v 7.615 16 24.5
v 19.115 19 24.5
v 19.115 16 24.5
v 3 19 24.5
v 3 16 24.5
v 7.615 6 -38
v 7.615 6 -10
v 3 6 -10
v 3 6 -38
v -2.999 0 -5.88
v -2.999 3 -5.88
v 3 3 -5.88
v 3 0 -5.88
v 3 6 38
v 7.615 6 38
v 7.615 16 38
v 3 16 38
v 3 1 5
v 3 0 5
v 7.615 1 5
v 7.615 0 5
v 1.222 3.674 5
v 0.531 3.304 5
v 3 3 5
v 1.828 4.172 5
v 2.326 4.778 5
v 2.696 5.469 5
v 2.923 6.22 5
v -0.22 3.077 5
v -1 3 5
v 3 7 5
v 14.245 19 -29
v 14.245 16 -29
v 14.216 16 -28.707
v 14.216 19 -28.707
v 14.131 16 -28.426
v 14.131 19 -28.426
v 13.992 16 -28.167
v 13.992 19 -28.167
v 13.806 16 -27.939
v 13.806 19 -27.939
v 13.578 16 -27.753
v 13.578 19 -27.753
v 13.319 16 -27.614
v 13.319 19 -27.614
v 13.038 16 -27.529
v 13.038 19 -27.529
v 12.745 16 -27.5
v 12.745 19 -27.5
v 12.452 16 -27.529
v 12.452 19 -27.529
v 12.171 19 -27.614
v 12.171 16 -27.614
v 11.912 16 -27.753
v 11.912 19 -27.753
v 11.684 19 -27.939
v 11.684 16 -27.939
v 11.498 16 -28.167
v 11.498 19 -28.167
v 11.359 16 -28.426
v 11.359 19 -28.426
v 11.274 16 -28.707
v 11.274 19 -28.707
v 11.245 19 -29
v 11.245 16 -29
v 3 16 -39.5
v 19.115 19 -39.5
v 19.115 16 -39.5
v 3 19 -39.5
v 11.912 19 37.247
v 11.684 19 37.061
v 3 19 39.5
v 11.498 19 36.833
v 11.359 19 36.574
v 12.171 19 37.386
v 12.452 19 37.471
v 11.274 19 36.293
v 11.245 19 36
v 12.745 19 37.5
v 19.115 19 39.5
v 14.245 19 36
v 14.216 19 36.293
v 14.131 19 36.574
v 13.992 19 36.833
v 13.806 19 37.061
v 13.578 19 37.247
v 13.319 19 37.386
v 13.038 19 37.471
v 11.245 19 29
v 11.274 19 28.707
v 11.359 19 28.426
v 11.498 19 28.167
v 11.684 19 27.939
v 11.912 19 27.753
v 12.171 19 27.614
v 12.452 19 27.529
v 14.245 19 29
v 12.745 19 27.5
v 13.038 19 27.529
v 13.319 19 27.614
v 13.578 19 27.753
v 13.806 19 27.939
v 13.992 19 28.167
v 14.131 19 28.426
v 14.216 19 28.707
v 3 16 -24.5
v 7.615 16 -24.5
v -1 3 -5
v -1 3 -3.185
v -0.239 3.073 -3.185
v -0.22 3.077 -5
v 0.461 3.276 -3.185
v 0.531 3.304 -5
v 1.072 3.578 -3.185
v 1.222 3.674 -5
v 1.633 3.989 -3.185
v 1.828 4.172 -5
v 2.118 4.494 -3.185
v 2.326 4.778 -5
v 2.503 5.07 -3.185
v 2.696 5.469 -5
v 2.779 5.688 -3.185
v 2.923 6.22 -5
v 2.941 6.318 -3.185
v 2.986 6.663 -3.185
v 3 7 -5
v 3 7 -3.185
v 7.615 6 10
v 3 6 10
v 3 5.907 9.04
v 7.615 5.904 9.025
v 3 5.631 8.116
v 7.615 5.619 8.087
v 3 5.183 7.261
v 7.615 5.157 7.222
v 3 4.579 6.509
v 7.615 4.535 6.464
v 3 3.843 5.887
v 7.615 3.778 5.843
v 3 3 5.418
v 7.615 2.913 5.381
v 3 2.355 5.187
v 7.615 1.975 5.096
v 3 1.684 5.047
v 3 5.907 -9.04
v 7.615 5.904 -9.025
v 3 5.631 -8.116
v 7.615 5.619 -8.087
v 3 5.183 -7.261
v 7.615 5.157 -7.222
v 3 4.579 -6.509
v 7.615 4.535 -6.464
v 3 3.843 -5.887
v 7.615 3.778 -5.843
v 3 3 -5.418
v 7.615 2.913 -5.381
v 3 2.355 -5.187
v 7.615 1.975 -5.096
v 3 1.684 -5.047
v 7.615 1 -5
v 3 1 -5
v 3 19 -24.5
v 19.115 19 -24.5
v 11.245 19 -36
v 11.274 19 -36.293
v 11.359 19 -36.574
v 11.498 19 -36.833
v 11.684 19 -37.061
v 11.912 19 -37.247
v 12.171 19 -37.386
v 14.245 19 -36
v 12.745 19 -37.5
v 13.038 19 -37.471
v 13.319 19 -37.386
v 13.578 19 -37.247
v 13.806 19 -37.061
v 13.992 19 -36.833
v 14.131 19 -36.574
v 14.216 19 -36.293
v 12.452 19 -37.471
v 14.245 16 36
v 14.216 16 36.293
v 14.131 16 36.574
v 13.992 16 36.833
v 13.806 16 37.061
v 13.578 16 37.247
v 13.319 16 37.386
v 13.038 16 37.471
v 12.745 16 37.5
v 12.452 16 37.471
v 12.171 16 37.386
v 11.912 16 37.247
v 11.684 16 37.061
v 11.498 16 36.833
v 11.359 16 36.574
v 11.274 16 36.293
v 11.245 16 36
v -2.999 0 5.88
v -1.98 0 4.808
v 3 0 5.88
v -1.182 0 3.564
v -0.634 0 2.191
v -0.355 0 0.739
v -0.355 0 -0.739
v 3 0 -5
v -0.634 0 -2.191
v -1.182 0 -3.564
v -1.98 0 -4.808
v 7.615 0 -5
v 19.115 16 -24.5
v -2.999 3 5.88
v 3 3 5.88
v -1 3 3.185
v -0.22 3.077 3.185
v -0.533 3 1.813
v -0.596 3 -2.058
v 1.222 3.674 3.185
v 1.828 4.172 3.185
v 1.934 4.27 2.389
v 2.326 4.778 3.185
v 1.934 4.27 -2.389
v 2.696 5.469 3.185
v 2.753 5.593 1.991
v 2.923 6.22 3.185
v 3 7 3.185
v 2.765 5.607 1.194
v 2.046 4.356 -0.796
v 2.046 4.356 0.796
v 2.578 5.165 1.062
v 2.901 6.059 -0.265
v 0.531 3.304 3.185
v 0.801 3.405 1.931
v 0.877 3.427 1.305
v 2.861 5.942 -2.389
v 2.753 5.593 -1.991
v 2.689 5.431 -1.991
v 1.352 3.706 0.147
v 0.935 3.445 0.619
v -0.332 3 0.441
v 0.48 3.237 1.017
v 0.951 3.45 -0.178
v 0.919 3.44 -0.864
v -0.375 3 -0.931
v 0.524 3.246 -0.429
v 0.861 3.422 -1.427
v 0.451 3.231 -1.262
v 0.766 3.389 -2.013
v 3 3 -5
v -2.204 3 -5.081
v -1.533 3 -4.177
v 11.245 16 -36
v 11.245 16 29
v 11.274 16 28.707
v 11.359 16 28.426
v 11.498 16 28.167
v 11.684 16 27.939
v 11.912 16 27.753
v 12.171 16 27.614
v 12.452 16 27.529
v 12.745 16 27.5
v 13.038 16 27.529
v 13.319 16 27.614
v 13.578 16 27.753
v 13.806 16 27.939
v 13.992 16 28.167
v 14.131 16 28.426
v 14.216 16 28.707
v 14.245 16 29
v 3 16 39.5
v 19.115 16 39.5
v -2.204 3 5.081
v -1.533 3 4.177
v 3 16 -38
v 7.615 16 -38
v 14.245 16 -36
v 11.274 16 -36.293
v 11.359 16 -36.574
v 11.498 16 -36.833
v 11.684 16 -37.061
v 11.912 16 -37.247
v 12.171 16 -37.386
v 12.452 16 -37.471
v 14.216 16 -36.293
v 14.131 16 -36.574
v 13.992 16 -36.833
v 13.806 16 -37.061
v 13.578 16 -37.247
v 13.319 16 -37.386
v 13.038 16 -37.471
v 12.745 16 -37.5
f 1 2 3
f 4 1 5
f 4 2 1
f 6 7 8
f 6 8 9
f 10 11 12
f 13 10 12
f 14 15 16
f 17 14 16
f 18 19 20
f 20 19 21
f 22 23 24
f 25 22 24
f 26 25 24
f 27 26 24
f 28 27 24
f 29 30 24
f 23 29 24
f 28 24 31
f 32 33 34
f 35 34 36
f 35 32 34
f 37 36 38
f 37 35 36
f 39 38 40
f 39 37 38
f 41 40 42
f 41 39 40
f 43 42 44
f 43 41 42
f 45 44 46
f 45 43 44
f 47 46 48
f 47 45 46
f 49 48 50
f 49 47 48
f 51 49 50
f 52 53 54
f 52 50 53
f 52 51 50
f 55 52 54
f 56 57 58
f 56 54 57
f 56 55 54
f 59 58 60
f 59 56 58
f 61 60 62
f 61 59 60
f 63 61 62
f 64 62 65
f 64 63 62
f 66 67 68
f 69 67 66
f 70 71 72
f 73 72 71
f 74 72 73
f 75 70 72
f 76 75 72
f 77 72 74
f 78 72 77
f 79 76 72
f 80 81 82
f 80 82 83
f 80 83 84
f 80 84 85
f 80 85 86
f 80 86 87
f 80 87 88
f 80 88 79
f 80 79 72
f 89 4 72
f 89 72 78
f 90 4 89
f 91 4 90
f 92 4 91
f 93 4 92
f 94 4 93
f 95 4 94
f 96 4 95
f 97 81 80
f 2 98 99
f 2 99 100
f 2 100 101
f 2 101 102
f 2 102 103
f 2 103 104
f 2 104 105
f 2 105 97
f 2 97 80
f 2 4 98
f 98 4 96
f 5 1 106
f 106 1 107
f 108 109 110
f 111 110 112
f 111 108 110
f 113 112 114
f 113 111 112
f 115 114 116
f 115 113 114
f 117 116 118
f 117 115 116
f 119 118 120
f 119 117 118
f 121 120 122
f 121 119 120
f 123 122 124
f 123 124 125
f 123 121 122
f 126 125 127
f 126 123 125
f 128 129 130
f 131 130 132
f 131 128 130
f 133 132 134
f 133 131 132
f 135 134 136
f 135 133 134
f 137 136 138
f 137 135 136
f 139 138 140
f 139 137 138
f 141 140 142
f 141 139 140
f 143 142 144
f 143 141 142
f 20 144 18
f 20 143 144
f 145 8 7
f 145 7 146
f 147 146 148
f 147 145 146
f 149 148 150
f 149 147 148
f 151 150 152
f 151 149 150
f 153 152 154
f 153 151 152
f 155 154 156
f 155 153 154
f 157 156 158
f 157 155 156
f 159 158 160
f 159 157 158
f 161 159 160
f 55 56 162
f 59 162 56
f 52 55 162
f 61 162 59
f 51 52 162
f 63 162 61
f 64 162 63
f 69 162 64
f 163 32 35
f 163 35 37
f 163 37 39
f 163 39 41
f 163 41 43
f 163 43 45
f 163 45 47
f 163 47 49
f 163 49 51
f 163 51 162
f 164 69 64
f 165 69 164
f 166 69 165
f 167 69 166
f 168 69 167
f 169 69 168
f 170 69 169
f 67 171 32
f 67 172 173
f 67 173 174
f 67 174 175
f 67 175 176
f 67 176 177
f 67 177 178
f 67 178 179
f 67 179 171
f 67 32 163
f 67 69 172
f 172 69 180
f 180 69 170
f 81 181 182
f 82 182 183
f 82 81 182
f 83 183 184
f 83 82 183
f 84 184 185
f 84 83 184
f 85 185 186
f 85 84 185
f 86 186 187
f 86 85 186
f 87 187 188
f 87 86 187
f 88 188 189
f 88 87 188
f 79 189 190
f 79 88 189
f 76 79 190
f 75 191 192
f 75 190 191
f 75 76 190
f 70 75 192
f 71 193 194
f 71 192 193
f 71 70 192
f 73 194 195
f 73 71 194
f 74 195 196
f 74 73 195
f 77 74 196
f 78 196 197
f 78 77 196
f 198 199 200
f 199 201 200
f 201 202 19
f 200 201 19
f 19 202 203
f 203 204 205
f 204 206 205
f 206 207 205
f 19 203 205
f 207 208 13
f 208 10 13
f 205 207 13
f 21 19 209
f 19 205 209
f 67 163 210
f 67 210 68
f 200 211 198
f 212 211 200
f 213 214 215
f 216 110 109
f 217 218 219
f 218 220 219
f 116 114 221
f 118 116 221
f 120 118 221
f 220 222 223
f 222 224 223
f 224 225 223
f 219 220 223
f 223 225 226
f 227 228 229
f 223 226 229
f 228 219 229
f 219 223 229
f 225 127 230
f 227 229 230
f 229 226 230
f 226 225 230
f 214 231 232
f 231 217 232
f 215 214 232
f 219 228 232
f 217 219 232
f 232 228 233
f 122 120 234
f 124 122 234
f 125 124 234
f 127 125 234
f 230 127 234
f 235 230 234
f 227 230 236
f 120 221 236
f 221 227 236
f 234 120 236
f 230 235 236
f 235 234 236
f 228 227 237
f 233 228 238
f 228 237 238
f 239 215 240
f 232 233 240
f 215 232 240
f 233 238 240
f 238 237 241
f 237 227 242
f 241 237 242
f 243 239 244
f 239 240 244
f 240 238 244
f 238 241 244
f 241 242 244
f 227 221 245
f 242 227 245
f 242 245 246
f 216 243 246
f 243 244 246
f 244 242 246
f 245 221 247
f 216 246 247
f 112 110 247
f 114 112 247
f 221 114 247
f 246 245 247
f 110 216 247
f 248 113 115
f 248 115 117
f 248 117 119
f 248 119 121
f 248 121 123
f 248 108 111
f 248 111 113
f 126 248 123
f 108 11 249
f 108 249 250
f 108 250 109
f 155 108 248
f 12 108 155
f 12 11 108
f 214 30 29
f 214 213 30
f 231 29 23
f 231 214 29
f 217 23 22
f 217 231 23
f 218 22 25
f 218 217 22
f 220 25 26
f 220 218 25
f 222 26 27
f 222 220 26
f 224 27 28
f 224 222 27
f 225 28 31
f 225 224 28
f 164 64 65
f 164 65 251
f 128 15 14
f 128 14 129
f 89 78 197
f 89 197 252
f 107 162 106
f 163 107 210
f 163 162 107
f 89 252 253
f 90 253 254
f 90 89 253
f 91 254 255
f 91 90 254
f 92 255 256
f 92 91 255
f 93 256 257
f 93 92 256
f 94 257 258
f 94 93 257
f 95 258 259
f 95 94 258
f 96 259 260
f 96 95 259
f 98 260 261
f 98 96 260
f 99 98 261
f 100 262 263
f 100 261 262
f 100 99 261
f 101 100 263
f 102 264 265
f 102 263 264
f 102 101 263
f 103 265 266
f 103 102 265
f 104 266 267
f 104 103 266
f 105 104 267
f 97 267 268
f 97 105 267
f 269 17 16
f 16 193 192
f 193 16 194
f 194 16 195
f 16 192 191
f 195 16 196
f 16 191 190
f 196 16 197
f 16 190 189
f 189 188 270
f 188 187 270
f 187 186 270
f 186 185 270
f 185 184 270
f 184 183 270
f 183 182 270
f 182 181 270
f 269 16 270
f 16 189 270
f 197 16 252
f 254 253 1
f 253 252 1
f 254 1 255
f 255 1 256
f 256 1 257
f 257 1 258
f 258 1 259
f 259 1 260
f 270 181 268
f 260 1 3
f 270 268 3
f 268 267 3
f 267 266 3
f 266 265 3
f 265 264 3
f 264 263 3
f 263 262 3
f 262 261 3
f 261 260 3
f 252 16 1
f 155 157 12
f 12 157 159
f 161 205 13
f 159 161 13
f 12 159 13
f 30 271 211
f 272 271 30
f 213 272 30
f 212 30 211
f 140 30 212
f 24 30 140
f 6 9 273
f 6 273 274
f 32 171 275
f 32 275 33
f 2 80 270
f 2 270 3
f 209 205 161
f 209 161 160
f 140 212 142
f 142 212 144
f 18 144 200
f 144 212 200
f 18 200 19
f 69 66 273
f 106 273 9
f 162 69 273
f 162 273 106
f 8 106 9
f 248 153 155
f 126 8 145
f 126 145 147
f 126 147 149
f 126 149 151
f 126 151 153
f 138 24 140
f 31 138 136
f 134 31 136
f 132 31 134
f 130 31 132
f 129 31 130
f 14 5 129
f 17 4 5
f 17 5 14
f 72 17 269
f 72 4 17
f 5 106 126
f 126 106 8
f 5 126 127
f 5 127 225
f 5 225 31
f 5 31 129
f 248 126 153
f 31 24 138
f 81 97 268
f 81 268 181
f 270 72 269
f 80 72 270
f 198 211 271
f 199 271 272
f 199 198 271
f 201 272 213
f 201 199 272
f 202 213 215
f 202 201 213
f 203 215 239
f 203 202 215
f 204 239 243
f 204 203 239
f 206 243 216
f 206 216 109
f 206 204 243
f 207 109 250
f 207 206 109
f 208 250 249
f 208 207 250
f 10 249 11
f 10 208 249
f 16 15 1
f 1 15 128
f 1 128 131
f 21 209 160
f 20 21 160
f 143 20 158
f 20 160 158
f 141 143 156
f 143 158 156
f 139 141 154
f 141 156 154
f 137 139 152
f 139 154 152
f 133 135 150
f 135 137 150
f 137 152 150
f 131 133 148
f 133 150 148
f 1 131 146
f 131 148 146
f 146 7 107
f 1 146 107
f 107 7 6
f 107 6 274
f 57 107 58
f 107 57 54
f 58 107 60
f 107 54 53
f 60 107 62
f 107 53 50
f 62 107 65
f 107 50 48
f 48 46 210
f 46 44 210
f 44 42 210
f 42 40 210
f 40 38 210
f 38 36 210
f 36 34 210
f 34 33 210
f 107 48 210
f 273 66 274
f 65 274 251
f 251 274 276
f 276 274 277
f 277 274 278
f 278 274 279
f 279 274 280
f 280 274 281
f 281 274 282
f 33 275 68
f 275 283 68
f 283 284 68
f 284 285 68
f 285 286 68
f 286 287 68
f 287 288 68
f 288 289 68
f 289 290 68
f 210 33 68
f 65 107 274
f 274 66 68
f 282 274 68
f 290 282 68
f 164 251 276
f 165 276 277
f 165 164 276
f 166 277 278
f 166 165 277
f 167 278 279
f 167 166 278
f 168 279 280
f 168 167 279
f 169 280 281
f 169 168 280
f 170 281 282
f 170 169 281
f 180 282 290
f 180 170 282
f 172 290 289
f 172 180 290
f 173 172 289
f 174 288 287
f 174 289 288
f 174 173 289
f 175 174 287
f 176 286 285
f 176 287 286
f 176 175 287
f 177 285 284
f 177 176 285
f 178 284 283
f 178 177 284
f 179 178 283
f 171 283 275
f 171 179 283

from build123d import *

# Parameters (mm, degrees)
SKETCH1_R           = 1.5
BOSS_EXTRUDE1_DEPTH = 3
SKETCH3_W           = 4.615398666
SKETCH3_H           = 10
BOSS_EXTRUDE2_DEPTH = 12.9997796
FILLET7_R           = 1
CUT_EXTRUDE4_DEPTH  = 10
FILLET8_R           = 4
SKETCH8_W           = 76
SKETCH8_H           = 10
BOSS_EXTRUDE3_DEPTH = 4.615398666
SKETCH9_W           = 14.615398666
SKETCH9_H           = 12
SKETCH9_R           = 1.5
BOSS_EXTRUDE4_DEPTH = 3
FILLET9_R           = 5
FILLET10_R          = 5
SKETCH10_W          = 9.773230982
SKETCH10_H          = 9.985016007
SKETCH10_W_2        = 12.713773796
SKETCH10_H_2        = 7.76031956
CUT_EXTRUDE6_DEPTH  = 10
CUT_EXTRUDE7_DEPTH  = 46.992324429
BOSS_EXTRUDE5_DEPTH = 3


with BuildPart() as part:
    # Sketch1 → Boss-Extrude1 (new body)
    with BuildSketch(Plane(origin=(0, 0, 0), x_dir=(1, 0, 0), z_dir=(0, 1, 0))):
        Polygon((-3, -11.32792047), (3, -11.32792047), (3, -5), (7.615398666, -5), (7.615398666, 5), (3, 5), (3, 11.32792047), (-3, 11.32792047), align=None)
        with Locations(Location((0, 8.5, 0), (0, 0, 270))):
            Circle(SKETCH1_R, mode=Mode.SUBTRACT)
        with Locations(Location((0, -8.5, 0), (0, 0, 270))):
            Circle(SKETCH1_R, mode=Mode.SUBTRACT)
    extrude(amount=BOSS_EXTRUDE1_DEPTH)

    # Sketch3 → Boss-Extrude2 (add)
    with BuildSketch(Plane(origin=(0, 3, 0), x_dir=(1, 0, 0), z_dir=(0, 1, 0))):
        with Locations((5.307699333, 0)):
            Rectangle(SKETCH3_W, SKETCH3_H)
    extrude(amount=BOSS_EXTRUDE2_DEPTH)

    # Fillet7
    fillet7_edges = [part.edges().sort_by_distance(p)[0] for p in [
        (3, 1.5, 11.32792047),
        (3, 1.5, -11.32792047),
    ]]
    fillet(fillet7_edges, radius=FILLET7_R)

    # Sketch7 → Cut-Extrude4 (cut)
    with BuildSketch(Plane.XZ):
        with BuildLine():
            Line((-3.65526474, -6.392053518), (-3.78188192, 6.478485425))
            ThreePointArc((-3.78188192, 6.478485425), (-0.319780446, 0.076652438), (-3.65526474, -6.392053518))
        make_face()
    extrude(amount=-CUT_EXTRUDE4_DEPTH, mode=Mode.SUBTRACT)

    # Fillet8
    fillet8_edges = [part.edges().sort_by_distance(p)[0] for p in [
        (3, 3, 0),
    ]]
    fillet(fillet8_edges, radius=FILLET8_R)

    # Sketch8 → Boss-Extrude3 (add)
    with BuildSketch(Plane(origin=(7.615398666, 0, 0), x_dir=(0, 0, -1), z_dir=(1, 0, 0))):
        with Locations((0, 10.9997796)):
            Rectangle(SKETCH8_W, SKETCH8_H)
    extrude(amount=-BOSS_EXTRUDE3_DEPTH)

    # Sketch9 → Boss-Extrude4 (add)
    # profile 1 of 2: a face of its own
    with BuildSketch(Plane(origin=(0, 15.9997796, 0), x_dir=(1, 0, 0), z_dir=(0, 1, 0))):
        with Locations((10.307699333, 32)):
            Rectangle(SKETCH9_W, SKETCH9_H)
        with Locations(Location((12.745112207, 32.5, 0), (0, 0, 270))):
            Circle(SKETCH9_R, mode=Mode.SUBTRACT)
    # profile 2 of 2: a face of its own
    with BuildSketch(Plane(origin=(0, 15.9997796, 0), x_dir=(1, 0, 0), z_dir=(0, 1, 0))):
        with Locations((10.307699333, -32)):
            Rectangle(SKETCH9_W, SKETCH9_H)
        with Locations(Location((12.745112207, -32.5, 0), (0, 0, 270))):
            Circle(SKETCH9_R, mode=Mode.SUBTRACT)
    extrude(amount=BOSS_EXTRUDE4_DEPTH)

    # Fillet9
    # the kernel refuses this fillet: 5 mm, written as the material it adds along each edge
    with BuildSketch(Plane(origin=(7.615398666, 5.9997796, 5), x_dir=(0, -1, 0), z_dir=(-1, 0, 0))) as fillet9_piece_1:
        with BuildLine():
            CenterArc((FILLET9_R, FILLET9_R), FILLET9_R, 180, 90)
            Line((0, FILLET9_R), (0, 0))
            Line((0, 0), (FILLET9_R, 0))
        make_face()
    extrude(amount=4.615398666)

    # Fillet10
    # the kernel refuses this fillet: 5 mm, written as the material it adds along each edge
    with BuildSketch(Plane(origin=(3, 5.9997796, -5), x_dir=(0, -1, 0), z_dir=(1, 0, 0))) as fillet10_piece_1:
        with BuildLine():
            CenterArc((FILLET10_R, FILLET10_R), FILLET10_R, 180, 90)
            Line((0, FILLET10_R), (0, 0))
            Line((0, 0), (FILLET10_R, 0))
        make_face()
    extrude(amount=4.615398666)

    # Sketch10 → Cut-Extrude6 (cut)
    with BuildSketch(Plane(origin=(0, 3, 0), x_dir=(1, 0, 0), z_dir=(0, 1, 0))):
        with Locations((-1.330252474, 10.872508004)):
            Rectangle(SKETCH10_W, SKETCH10_H)
        with Locations((-2.800523881, -9.76015978)):
            Rectangle(SKETCH10_W_2, SKETCH10_H_2)
    extrude(amount=-CUT_EXTRUDE6_DEPTH, mode=Mode.SUBTRACT)

    # Sketch11 → Cut-Extrude7 (cut, through all)
    with BuildSketch(Plane(origin=(0, 18.9997796, 0), x_dir=(1, 0, 0), z_dir=(0, 1, 0))):
        with BuildLine():
            Line((14.245112207, 36), (14.245112207, 29))
            ThreePointArc((14.245112207, 29), (12.745112207, 27.5), (11.245112207, 29))
            Line((11.245112207, 29), (11.245112207, 36))
            ThreePointArc((11.245112207, 36), (12.745112207, 37.5), (14.245112207, 36))
        make_face()
        with BuildLine():
            Line((14.245112207, -29), (14.245112207, -36))
            ThreePointArc((14.245112207, -36), (12.745112207, -37.5), (11.245112207, -36))
            Line((11.245112207, -36), (11.245112207, -29))
            ThreePointArc((11.245112207, -29), (12.745112207, -27.5), (14.245112207, -29))
        make_face()
    extrude(amount=-CUT_EXTRUDE7_DEPTH, mode=Mode.SUBTRACT)

    # Sketch13 → Boss-Extrude5 (add)
    with BuildSketch(Plane(origin=(0, 18.9997796, 0), x_dir=(1, 0, 0), z_dir=(0, 1, 0))):
        Polygon((3, -38), (3, -39.5), (19.115398666, -39.5), (19.115398666, -24.5), (3, -24.5), (3, -26), (17.615398666, -26), (17.615398666, -38), align=None)
        Polygon((3, 26), (3, 24.5), (19.115398666, 24.5), (19.115398666, 39.5), (3, 39.5), (3, 38), (17.615398666, 38), (17.615398666, 26), align=None)
    extrude(amount=-BOSS_EXTRUDE5_DEPTH)


solid = part.part
